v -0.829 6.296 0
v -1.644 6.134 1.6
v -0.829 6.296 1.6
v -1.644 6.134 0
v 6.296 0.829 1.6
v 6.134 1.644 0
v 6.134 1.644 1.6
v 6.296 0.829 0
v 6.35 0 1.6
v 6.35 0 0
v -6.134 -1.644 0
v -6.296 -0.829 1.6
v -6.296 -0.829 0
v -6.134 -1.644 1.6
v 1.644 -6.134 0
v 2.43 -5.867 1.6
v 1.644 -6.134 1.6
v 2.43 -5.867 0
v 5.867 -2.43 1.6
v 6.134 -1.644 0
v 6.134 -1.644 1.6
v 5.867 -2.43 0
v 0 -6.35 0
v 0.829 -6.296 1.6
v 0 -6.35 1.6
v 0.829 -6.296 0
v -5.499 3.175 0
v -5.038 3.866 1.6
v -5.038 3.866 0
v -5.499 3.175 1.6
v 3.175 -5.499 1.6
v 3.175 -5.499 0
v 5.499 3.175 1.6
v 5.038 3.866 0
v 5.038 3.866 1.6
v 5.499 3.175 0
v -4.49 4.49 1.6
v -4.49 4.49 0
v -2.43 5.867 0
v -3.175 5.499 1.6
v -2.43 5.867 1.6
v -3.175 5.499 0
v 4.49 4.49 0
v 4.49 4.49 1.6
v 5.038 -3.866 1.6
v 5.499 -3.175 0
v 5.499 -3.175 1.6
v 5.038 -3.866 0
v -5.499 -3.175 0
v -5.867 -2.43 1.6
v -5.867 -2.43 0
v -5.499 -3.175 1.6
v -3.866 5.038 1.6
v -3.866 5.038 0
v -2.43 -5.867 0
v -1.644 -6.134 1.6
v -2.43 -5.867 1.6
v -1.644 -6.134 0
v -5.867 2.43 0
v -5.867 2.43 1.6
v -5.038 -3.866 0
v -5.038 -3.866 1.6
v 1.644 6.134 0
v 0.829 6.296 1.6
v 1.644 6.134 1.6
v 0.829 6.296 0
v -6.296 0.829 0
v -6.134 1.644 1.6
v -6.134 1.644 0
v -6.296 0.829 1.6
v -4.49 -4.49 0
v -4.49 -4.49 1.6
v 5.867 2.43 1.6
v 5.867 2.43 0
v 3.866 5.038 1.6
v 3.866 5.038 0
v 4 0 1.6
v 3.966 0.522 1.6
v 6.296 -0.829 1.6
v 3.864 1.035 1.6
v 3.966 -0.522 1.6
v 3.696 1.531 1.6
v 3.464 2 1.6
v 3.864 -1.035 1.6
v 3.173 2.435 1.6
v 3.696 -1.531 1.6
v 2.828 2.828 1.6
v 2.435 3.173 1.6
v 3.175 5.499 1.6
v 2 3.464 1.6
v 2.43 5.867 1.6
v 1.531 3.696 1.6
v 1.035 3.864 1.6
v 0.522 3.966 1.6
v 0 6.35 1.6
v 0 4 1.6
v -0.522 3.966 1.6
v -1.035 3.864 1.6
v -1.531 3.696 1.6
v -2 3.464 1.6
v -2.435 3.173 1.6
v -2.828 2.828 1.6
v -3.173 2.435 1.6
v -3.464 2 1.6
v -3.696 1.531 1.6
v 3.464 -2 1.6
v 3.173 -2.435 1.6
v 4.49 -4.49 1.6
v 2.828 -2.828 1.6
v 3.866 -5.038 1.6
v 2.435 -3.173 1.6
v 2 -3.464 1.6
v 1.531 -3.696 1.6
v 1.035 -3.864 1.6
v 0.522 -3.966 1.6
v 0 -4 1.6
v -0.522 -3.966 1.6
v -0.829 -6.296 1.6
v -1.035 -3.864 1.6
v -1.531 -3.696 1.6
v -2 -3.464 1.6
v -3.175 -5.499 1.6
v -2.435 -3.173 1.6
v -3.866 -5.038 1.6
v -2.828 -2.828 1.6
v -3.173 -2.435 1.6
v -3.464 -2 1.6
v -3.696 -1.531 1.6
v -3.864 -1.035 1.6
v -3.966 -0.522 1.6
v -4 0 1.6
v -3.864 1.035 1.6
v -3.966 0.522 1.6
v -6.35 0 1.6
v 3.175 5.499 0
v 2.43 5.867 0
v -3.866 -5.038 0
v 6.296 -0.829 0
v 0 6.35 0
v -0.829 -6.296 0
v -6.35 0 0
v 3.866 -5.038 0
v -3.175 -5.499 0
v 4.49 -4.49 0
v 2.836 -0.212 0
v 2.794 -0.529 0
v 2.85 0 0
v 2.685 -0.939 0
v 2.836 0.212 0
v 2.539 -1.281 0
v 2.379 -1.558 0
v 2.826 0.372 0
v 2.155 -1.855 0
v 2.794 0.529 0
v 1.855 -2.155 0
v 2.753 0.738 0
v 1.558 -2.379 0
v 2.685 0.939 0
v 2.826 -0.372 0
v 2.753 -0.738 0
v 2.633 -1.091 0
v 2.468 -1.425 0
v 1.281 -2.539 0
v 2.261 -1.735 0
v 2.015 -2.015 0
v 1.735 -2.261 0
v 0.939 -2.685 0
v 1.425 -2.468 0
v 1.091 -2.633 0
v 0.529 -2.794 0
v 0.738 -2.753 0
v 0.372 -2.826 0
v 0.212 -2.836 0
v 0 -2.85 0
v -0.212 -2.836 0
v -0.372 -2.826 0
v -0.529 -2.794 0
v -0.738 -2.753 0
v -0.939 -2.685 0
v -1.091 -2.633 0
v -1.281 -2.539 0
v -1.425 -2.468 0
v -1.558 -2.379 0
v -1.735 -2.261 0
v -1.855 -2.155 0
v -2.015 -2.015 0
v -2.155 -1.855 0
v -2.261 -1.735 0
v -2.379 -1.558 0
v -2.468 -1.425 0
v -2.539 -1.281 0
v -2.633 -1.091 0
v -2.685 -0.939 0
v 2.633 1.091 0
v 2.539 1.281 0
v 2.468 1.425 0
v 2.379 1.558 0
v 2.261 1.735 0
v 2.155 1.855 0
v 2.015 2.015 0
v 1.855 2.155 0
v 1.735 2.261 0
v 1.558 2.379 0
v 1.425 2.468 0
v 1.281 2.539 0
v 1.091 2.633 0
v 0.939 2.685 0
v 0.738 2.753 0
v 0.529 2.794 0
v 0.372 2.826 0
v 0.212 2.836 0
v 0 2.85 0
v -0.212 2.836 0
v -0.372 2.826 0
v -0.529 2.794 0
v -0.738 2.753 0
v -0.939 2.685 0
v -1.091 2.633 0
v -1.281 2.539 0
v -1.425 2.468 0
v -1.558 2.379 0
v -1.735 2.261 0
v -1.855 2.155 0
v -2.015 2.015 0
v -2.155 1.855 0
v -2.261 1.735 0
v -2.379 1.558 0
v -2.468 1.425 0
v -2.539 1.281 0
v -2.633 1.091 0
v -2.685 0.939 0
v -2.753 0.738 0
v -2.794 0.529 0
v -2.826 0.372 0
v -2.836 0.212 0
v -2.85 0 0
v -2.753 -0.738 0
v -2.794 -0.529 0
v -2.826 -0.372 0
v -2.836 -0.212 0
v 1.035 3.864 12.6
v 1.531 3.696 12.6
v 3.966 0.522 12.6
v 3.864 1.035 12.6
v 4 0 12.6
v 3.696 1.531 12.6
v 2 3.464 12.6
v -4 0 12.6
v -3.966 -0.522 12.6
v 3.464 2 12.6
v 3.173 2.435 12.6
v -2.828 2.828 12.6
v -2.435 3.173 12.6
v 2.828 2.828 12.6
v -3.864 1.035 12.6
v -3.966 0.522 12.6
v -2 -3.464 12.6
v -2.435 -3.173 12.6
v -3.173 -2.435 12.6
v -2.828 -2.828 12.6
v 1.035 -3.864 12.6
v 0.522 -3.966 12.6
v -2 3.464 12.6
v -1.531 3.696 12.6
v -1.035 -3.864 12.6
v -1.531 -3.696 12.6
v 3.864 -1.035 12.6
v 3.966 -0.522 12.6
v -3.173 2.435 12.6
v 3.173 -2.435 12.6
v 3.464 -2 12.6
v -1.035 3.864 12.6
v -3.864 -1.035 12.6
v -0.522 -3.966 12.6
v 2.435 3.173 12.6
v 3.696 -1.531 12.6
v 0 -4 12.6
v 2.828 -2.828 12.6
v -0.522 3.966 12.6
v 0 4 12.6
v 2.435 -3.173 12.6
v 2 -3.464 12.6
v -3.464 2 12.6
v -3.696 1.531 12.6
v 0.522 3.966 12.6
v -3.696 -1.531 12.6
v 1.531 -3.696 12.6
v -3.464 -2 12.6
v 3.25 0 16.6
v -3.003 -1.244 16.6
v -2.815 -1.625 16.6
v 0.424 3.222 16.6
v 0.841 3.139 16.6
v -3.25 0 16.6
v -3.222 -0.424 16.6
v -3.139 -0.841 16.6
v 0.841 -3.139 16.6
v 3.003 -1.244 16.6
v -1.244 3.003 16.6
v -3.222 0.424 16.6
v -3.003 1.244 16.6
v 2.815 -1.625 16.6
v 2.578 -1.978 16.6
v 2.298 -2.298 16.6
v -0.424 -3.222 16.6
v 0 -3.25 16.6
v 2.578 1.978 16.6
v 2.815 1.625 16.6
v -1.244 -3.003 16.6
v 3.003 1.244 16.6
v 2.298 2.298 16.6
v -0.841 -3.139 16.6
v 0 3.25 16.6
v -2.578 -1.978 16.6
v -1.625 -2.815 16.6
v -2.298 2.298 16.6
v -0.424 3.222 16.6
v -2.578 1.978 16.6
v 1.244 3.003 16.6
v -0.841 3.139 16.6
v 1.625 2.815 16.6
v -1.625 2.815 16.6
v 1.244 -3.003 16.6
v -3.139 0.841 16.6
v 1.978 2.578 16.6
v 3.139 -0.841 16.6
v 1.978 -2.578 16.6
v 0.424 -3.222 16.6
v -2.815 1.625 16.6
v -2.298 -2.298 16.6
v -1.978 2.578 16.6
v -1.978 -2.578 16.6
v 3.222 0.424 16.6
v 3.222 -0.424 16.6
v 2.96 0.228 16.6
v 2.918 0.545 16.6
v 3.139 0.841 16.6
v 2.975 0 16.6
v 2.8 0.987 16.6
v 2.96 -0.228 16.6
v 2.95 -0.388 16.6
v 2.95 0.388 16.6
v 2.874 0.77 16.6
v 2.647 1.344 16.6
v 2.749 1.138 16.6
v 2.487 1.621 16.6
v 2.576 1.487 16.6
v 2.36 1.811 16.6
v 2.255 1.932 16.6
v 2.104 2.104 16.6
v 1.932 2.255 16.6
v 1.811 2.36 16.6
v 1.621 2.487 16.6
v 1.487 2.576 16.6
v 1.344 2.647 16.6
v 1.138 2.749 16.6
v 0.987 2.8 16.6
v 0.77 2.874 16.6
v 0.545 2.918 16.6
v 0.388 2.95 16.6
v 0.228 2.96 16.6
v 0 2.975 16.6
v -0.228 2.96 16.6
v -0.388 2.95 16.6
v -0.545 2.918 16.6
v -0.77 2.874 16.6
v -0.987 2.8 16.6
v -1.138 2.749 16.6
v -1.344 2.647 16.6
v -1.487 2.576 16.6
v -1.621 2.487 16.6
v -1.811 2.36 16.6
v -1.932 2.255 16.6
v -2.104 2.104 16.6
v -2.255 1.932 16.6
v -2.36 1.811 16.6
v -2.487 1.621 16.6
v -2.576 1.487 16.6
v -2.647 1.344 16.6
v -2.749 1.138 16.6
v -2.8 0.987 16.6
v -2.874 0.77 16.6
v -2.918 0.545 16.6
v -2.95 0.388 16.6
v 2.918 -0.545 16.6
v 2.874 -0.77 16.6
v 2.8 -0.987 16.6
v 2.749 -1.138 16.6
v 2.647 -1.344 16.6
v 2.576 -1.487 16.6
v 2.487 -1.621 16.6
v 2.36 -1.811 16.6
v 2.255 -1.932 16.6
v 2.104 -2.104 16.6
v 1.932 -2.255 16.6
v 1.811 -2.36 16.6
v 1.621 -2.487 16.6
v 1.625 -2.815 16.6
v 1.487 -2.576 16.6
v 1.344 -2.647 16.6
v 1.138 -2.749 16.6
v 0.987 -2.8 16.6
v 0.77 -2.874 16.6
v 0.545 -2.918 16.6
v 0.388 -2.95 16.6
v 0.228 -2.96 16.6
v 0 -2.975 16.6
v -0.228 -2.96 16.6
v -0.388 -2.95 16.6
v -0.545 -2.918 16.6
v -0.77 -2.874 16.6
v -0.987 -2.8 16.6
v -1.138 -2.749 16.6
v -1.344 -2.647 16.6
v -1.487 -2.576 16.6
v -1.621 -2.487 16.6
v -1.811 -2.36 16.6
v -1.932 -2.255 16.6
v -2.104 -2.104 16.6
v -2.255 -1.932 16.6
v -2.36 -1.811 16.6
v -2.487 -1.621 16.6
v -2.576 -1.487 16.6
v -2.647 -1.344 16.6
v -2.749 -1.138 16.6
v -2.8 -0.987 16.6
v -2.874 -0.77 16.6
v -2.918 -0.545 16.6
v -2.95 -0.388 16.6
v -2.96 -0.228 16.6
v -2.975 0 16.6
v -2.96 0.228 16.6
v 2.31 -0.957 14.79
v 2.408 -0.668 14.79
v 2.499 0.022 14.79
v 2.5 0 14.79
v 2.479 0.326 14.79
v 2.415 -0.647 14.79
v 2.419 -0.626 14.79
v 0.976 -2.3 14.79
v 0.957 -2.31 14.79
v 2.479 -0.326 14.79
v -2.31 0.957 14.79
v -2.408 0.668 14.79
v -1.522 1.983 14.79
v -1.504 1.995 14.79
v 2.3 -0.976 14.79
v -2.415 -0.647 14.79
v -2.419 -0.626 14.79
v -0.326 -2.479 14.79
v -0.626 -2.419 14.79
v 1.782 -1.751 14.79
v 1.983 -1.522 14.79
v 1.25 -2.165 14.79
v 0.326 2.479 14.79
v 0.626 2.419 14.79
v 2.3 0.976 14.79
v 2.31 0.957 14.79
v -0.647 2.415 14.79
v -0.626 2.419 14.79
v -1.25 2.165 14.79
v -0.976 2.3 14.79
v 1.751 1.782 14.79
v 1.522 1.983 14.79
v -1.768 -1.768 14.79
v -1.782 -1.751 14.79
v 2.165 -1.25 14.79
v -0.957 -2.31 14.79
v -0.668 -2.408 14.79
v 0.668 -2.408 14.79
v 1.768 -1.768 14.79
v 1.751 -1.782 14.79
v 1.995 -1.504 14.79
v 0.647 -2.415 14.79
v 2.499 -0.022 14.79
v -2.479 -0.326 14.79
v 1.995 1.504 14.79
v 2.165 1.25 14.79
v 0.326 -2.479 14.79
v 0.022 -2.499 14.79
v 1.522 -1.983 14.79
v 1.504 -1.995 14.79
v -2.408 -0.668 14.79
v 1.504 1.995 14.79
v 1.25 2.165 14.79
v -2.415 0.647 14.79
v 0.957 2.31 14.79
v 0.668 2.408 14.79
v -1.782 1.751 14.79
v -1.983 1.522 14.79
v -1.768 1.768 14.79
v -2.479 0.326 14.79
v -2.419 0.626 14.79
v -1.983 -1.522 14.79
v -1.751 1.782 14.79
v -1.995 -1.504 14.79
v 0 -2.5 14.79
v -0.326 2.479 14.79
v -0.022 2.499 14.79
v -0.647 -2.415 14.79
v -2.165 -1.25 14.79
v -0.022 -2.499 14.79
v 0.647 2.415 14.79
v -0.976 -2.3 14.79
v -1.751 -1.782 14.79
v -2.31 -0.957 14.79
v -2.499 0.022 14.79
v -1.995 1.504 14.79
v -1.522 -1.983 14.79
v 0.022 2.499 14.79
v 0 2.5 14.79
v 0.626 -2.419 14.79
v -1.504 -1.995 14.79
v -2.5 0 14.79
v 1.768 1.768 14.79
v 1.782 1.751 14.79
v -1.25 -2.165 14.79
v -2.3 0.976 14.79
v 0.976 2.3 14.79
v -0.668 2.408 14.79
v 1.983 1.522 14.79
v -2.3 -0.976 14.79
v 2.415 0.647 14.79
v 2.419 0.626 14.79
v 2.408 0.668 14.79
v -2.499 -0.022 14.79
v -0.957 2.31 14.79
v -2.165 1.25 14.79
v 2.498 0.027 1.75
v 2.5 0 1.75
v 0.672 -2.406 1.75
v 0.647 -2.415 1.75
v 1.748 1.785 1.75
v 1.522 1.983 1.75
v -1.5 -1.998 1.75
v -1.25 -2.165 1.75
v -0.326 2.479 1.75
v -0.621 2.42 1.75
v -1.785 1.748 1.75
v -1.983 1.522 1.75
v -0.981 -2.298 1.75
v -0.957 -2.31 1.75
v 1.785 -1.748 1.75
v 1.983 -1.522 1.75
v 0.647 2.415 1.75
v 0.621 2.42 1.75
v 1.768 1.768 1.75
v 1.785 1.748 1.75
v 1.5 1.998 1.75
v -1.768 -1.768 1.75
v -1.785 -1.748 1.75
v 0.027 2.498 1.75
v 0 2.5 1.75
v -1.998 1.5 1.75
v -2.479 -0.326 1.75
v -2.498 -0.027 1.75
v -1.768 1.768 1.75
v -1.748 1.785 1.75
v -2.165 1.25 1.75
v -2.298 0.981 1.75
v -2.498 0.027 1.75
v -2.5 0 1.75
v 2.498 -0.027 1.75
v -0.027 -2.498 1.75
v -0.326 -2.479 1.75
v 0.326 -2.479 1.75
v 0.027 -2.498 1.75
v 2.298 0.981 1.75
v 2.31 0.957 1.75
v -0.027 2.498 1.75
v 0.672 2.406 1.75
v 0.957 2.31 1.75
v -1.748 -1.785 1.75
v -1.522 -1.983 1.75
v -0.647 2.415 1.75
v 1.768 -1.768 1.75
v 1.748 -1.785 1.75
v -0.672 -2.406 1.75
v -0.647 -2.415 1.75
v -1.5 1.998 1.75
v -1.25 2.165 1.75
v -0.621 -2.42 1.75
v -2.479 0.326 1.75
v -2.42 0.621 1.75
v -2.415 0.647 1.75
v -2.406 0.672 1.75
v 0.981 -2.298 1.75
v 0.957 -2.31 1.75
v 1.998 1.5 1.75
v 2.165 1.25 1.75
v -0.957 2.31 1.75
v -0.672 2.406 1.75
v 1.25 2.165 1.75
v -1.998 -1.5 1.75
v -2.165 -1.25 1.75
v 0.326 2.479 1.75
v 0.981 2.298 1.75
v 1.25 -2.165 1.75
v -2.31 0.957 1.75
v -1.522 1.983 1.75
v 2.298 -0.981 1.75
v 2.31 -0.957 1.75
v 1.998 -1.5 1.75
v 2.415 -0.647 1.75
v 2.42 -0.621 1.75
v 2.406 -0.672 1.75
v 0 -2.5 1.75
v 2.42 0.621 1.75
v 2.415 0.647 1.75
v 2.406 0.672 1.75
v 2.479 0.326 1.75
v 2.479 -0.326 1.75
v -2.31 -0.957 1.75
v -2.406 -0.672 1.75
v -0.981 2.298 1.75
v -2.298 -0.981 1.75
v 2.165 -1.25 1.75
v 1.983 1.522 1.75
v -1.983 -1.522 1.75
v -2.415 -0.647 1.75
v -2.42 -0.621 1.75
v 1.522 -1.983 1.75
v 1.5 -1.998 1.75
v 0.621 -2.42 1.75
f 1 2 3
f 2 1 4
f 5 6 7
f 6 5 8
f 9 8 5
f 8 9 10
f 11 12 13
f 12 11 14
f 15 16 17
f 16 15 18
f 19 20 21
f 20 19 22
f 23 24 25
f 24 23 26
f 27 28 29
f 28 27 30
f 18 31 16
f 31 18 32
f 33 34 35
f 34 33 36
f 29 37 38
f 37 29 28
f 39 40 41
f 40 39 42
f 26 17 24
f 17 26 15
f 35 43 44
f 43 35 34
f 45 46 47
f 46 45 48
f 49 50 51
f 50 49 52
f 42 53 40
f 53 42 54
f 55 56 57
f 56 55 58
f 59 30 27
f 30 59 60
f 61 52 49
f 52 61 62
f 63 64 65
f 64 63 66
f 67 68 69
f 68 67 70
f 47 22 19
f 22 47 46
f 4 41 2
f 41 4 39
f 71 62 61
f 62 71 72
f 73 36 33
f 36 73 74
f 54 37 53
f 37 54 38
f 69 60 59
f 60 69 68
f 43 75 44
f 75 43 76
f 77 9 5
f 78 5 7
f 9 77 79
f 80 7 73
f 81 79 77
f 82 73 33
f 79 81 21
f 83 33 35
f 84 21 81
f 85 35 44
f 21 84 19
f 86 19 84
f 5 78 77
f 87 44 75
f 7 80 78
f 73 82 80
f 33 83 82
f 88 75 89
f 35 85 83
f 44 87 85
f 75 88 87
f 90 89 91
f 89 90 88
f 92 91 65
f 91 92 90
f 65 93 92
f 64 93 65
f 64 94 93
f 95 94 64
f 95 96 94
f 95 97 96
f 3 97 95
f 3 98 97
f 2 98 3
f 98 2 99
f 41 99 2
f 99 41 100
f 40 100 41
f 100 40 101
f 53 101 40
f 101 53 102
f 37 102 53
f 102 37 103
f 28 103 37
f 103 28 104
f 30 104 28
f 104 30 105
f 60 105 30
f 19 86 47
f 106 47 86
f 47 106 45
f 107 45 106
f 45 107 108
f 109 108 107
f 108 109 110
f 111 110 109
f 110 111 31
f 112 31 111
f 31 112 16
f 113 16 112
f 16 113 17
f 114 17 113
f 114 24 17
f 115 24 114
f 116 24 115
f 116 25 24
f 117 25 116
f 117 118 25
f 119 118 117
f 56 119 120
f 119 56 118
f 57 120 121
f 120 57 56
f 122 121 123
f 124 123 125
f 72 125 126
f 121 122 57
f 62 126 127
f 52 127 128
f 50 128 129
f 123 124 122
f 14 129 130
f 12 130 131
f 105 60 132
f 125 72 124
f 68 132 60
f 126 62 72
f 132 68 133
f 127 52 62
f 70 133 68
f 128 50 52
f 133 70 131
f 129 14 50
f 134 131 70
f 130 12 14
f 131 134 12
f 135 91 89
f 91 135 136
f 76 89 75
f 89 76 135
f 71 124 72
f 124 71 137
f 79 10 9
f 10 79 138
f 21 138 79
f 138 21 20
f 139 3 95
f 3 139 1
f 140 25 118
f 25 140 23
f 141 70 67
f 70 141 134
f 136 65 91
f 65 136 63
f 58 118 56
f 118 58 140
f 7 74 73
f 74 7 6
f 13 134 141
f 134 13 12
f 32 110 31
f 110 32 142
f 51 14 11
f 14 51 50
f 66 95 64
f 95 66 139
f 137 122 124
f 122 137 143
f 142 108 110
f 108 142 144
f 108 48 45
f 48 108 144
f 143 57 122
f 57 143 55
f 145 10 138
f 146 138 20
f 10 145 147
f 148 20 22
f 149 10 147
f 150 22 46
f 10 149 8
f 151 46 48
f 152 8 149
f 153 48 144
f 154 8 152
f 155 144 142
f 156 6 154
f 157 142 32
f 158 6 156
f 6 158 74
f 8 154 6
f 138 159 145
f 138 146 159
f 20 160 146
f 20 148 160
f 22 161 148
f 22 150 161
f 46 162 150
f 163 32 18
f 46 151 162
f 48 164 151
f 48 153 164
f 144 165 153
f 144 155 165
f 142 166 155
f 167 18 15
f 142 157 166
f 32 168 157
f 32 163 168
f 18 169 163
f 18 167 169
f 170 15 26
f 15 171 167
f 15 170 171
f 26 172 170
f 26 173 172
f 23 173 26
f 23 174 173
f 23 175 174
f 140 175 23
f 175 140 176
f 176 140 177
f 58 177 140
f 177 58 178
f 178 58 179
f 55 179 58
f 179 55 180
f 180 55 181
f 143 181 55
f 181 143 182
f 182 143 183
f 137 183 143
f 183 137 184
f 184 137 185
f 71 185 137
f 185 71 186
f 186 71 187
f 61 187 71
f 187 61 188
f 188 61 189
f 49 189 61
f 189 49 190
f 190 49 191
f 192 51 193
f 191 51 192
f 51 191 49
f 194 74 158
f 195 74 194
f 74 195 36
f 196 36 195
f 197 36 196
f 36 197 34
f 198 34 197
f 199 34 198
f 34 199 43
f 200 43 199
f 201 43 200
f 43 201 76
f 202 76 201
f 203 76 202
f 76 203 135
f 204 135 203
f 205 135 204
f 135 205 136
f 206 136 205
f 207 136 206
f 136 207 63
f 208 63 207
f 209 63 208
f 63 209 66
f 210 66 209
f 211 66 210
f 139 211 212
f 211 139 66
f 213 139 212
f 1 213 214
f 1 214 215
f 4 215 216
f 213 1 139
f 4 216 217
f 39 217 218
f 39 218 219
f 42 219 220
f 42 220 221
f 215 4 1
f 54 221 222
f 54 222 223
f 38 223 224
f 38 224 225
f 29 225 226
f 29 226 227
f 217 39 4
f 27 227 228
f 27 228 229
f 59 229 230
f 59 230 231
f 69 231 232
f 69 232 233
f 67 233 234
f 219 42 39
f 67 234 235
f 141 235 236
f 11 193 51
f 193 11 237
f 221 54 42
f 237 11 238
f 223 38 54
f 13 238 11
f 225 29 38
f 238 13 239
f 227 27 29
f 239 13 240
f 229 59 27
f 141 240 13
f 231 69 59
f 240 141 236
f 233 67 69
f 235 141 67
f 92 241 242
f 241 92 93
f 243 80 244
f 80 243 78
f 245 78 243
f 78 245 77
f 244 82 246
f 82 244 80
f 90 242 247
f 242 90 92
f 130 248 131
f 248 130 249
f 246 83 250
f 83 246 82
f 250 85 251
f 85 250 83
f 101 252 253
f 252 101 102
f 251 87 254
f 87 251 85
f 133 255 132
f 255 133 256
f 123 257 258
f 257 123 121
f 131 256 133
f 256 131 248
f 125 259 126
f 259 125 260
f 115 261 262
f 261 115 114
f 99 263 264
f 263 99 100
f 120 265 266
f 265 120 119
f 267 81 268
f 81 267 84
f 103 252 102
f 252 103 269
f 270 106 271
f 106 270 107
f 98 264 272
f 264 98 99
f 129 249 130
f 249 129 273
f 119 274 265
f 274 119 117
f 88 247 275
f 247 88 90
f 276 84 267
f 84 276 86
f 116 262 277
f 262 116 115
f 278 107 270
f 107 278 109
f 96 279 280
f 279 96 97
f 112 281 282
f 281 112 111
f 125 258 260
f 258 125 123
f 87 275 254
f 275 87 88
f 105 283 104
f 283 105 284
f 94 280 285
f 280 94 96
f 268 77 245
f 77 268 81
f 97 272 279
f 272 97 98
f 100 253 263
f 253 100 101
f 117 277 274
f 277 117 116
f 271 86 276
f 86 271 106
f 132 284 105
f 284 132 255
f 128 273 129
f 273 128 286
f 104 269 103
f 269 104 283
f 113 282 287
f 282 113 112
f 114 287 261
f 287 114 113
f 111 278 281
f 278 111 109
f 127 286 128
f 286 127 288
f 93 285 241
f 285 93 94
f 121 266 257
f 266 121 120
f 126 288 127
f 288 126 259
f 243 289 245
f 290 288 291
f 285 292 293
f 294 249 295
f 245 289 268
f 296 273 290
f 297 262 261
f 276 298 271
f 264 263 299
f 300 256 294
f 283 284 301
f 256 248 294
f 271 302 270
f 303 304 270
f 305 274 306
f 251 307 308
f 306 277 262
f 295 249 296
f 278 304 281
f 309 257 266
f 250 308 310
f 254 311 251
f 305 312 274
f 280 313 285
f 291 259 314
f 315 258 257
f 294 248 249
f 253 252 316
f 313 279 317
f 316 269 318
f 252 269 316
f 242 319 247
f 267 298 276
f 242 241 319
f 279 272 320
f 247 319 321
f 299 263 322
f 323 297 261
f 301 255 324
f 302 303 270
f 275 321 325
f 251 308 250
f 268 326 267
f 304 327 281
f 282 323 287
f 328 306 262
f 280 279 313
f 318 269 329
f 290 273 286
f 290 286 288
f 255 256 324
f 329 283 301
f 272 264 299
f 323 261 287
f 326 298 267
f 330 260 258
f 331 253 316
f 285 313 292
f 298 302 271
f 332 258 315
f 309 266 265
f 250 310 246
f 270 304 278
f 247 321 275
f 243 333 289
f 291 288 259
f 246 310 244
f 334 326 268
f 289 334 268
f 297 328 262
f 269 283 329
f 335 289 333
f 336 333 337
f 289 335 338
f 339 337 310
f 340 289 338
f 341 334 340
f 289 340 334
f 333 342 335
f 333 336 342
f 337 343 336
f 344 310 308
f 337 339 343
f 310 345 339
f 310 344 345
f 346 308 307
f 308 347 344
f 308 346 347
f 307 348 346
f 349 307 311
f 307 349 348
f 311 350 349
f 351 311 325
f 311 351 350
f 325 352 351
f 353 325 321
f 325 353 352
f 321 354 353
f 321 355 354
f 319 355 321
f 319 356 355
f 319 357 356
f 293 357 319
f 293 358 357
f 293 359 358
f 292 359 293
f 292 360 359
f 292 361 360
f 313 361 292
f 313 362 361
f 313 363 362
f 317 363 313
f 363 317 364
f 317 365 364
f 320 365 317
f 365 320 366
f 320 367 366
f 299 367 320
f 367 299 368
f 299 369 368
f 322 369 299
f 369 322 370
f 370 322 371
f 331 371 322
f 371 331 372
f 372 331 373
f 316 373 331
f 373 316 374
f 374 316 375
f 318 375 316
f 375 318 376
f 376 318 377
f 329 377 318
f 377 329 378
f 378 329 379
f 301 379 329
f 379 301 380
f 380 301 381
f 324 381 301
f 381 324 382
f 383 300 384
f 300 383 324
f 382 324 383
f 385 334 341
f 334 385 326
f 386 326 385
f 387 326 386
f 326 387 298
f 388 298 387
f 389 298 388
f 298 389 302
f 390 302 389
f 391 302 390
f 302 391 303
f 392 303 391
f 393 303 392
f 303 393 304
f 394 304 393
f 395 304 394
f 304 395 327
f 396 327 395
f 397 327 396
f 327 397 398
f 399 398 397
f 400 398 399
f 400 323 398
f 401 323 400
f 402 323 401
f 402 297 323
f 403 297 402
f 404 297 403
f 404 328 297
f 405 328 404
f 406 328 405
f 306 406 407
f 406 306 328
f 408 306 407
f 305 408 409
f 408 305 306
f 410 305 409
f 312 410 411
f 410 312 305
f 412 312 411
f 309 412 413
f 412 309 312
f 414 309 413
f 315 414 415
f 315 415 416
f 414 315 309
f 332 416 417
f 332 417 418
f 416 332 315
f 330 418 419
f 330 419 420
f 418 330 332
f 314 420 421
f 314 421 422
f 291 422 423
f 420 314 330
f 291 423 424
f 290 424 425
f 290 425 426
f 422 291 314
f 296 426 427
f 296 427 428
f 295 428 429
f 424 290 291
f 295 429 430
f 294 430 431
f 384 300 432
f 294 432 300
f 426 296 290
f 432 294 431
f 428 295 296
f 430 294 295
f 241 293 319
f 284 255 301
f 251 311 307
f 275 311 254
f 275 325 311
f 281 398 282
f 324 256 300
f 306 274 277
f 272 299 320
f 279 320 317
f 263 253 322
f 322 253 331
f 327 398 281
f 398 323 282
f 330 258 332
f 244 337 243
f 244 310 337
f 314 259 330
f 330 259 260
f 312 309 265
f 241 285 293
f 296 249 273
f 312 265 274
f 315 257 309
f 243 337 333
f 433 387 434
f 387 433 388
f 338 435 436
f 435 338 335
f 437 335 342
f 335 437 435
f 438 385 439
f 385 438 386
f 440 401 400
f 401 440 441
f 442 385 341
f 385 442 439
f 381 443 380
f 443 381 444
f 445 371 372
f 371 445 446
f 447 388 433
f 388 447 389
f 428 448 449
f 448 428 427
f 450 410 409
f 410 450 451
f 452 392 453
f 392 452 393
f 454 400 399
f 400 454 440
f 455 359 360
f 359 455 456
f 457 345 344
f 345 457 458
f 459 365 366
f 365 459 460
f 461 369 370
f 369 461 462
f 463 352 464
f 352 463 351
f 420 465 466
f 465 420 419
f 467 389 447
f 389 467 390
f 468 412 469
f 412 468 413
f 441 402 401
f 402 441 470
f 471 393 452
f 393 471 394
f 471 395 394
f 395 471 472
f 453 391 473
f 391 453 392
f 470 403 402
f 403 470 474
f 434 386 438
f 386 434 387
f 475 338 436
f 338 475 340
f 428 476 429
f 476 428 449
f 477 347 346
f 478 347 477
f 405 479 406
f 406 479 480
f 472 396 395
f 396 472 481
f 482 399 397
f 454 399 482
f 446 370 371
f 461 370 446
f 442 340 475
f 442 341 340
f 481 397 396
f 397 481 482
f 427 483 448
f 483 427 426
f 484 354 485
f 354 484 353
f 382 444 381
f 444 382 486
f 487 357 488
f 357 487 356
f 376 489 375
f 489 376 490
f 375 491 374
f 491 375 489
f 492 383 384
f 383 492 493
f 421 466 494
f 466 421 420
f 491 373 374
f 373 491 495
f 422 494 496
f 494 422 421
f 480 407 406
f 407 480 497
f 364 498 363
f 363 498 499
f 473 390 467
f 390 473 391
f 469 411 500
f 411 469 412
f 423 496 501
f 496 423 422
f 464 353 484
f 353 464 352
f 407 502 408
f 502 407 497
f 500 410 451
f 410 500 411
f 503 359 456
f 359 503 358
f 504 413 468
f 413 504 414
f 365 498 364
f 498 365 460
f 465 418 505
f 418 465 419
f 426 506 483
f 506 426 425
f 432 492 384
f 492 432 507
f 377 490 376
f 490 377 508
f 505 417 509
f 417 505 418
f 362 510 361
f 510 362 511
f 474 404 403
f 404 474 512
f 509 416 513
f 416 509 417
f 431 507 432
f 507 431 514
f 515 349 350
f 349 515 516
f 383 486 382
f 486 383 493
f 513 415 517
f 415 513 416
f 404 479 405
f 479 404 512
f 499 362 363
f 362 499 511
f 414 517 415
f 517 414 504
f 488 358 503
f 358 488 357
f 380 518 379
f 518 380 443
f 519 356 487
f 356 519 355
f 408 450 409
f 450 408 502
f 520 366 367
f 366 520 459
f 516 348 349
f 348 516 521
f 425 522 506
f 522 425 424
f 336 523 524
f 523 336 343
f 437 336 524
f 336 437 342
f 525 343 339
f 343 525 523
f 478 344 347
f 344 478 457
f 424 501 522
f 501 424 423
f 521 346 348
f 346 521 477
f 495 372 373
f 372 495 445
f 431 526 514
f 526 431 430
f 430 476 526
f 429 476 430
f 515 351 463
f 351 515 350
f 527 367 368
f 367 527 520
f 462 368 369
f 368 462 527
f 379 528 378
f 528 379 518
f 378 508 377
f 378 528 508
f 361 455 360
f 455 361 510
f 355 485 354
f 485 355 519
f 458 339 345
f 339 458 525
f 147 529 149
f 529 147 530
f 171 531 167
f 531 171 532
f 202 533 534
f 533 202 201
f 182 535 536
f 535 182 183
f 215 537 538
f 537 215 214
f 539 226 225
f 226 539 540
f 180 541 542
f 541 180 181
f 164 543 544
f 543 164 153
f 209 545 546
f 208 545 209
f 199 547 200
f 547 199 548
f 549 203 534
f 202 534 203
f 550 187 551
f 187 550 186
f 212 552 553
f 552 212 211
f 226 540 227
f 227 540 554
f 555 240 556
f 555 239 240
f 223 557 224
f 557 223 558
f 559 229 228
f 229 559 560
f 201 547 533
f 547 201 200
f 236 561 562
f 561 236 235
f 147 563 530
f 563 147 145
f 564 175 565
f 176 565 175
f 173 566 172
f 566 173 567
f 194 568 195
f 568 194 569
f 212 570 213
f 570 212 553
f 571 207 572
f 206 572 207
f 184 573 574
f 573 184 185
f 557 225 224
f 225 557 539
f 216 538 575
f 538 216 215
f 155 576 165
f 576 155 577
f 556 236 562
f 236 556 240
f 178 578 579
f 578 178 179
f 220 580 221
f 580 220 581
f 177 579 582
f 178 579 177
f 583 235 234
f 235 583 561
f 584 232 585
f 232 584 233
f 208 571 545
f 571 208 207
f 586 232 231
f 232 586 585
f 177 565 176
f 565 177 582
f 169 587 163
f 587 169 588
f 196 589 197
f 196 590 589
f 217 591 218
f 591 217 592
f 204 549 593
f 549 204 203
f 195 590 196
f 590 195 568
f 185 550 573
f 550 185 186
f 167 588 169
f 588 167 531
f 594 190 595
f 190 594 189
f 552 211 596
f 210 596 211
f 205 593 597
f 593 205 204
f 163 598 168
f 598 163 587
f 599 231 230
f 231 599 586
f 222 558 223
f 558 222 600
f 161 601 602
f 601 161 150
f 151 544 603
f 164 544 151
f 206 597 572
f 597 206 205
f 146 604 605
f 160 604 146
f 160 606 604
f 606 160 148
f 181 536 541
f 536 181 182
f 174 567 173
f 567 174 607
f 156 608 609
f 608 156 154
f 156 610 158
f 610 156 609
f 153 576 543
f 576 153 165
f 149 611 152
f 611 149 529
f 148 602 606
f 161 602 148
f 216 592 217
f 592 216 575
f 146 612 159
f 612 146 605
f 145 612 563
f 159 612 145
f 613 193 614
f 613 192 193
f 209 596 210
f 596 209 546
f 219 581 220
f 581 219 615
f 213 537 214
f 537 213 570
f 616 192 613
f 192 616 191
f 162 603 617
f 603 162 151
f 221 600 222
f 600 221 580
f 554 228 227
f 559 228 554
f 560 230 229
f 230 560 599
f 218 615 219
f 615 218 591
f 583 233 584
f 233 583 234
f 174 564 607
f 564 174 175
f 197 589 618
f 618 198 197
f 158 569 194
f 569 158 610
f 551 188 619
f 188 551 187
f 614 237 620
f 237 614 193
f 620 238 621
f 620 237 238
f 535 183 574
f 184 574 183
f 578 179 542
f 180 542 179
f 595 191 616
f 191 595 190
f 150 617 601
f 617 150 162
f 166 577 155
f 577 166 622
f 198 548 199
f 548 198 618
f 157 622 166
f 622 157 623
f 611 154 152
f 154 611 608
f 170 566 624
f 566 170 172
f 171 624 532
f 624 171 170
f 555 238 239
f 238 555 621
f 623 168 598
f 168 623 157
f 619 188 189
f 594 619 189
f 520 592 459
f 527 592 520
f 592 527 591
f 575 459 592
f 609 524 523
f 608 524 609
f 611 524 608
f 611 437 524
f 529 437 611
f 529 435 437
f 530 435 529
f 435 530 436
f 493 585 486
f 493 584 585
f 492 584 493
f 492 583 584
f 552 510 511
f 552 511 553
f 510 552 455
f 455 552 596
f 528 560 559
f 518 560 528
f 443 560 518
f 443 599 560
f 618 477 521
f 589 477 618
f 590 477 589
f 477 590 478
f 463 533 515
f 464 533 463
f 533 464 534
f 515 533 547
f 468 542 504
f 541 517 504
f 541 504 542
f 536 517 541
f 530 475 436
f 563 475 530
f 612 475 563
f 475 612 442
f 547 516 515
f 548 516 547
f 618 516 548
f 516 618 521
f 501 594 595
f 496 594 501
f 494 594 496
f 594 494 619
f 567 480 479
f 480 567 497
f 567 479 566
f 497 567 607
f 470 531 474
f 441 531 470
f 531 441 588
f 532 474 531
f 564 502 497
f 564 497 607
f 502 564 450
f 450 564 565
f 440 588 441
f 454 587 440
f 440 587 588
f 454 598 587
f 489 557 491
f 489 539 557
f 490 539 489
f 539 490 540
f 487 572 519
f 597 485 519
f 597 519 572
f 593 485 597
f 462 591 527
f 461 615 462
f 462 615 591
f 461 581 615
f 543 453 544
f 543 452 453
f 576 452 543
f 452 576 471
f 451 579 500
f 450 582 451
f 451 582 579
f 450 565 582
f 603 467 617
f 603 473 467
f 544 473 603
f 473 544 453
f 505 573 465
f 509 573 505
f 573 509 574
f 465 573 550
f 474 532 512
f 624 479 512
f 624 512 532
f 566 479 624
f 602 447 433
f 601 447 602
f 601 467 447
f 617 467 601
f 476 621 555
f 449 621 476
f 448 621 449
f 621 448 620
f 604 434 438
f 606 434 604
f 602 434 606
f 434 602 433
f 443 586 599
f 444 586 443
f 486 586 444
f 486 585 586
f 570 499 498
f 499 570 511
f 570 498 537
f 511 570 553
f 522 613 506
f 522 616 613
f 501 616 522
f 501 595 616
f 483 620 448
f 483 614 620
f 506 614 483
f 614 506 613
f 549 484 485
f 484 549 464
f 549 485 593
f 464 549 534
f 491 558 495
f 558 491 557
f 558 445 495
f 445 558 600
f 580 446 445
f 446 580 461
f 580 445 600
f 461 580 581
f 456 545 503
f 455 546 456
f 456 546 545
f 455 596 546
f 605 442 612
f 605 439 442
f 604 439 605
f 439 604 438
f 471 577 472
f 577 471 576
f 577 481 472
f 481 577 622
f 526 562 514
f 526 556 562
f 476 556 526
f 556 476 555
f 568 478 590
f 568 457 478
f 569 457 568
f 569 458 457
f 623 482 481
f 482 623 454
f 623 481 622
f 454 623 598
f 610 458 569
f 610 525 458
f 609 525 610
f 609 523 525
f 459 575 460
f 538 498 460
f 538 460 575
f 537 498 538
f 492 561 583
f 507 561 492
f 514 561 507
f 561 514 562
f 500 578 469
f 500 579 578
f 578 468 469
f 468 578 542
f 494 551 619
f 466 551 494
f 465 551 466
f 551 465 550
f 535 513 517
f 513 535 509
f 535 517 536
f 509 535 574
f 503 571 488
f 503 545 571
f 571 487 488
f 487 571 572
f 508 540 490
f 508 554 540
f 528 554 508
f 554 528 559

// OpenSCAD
// WedgePlug-v1.1
// 
// A plug for inserting into e.g. gridbeam holes,
// into which a threaded insert can be heat-set
// (or not!), so that a smaller screw can be conveniently
// threaded into the hole from the other side.
// 
// An optional 'funnel' (if funnel_depth > 0) at the top
// and bottom can help guide the screw and/or the heat-set
// insert into place.
// 
// Default values are intended for adapting 5/16" holes
// to take #6-32 screws, providing a good amount of length
// without blocking crosswise holes.
// 
// Changes:
// v1.1:
// - Taper just the end instead of the entire length of the plug,
//   since plugs made from v1.0 were kinda weak
// - Length no longer includes the flange thickness
// - Funnel large diameter configurable separately from taper small diameter

/* [Exterior] */

// Length of barrel, not including flange
length           = 15.0; // 0.1
small_diameter   =  6.5; // 0.1
large_diameter   =  8.0; // 0.1
taper_length     =  4.0; // 0.1
flange_thickness =  1.6; // 0.1
flange_diameter  = 12.7; // 0.1

/* [Hole] */

funnel_depth          =  2.0; // 0.1
funnel_large_diameter = 6.0; // 0.1
hole_diameter         =  5.0; // 0.1

/* [Detail] */

$fn = 48;

total_height = flange_thickness+length;

difference() {
	union() {
		if( flange_thickness > 0 && flange_diameter > 0 ) {
			cylinder(d=flange_diameter, h=flange_thickness, center=false);
		}
		cylinder(d=large_diameter, h=total_height-taper_length);
		translate([0,0,total_height-taper_length]) cylinder(d1=large_diameter, d2=small_diameter, h=taper_length);
	}
	translate([0,0,length/2]) cylinder(h=length*2, d=hole_diameter, center=true);
	if(funnel_depth > 0) {
		translate([0,0,total_height]) cylinder(h=funnel_depth*2, d1=hole_diameter-0.1, d2=funnel_large_diameter+(funnel_large_diameter-hole_diameter), center=true);
		cylinder(h=funnel_depth*2, d2=hole_diameter-0.1, d1=small_diameter, center=true);
	}
}
